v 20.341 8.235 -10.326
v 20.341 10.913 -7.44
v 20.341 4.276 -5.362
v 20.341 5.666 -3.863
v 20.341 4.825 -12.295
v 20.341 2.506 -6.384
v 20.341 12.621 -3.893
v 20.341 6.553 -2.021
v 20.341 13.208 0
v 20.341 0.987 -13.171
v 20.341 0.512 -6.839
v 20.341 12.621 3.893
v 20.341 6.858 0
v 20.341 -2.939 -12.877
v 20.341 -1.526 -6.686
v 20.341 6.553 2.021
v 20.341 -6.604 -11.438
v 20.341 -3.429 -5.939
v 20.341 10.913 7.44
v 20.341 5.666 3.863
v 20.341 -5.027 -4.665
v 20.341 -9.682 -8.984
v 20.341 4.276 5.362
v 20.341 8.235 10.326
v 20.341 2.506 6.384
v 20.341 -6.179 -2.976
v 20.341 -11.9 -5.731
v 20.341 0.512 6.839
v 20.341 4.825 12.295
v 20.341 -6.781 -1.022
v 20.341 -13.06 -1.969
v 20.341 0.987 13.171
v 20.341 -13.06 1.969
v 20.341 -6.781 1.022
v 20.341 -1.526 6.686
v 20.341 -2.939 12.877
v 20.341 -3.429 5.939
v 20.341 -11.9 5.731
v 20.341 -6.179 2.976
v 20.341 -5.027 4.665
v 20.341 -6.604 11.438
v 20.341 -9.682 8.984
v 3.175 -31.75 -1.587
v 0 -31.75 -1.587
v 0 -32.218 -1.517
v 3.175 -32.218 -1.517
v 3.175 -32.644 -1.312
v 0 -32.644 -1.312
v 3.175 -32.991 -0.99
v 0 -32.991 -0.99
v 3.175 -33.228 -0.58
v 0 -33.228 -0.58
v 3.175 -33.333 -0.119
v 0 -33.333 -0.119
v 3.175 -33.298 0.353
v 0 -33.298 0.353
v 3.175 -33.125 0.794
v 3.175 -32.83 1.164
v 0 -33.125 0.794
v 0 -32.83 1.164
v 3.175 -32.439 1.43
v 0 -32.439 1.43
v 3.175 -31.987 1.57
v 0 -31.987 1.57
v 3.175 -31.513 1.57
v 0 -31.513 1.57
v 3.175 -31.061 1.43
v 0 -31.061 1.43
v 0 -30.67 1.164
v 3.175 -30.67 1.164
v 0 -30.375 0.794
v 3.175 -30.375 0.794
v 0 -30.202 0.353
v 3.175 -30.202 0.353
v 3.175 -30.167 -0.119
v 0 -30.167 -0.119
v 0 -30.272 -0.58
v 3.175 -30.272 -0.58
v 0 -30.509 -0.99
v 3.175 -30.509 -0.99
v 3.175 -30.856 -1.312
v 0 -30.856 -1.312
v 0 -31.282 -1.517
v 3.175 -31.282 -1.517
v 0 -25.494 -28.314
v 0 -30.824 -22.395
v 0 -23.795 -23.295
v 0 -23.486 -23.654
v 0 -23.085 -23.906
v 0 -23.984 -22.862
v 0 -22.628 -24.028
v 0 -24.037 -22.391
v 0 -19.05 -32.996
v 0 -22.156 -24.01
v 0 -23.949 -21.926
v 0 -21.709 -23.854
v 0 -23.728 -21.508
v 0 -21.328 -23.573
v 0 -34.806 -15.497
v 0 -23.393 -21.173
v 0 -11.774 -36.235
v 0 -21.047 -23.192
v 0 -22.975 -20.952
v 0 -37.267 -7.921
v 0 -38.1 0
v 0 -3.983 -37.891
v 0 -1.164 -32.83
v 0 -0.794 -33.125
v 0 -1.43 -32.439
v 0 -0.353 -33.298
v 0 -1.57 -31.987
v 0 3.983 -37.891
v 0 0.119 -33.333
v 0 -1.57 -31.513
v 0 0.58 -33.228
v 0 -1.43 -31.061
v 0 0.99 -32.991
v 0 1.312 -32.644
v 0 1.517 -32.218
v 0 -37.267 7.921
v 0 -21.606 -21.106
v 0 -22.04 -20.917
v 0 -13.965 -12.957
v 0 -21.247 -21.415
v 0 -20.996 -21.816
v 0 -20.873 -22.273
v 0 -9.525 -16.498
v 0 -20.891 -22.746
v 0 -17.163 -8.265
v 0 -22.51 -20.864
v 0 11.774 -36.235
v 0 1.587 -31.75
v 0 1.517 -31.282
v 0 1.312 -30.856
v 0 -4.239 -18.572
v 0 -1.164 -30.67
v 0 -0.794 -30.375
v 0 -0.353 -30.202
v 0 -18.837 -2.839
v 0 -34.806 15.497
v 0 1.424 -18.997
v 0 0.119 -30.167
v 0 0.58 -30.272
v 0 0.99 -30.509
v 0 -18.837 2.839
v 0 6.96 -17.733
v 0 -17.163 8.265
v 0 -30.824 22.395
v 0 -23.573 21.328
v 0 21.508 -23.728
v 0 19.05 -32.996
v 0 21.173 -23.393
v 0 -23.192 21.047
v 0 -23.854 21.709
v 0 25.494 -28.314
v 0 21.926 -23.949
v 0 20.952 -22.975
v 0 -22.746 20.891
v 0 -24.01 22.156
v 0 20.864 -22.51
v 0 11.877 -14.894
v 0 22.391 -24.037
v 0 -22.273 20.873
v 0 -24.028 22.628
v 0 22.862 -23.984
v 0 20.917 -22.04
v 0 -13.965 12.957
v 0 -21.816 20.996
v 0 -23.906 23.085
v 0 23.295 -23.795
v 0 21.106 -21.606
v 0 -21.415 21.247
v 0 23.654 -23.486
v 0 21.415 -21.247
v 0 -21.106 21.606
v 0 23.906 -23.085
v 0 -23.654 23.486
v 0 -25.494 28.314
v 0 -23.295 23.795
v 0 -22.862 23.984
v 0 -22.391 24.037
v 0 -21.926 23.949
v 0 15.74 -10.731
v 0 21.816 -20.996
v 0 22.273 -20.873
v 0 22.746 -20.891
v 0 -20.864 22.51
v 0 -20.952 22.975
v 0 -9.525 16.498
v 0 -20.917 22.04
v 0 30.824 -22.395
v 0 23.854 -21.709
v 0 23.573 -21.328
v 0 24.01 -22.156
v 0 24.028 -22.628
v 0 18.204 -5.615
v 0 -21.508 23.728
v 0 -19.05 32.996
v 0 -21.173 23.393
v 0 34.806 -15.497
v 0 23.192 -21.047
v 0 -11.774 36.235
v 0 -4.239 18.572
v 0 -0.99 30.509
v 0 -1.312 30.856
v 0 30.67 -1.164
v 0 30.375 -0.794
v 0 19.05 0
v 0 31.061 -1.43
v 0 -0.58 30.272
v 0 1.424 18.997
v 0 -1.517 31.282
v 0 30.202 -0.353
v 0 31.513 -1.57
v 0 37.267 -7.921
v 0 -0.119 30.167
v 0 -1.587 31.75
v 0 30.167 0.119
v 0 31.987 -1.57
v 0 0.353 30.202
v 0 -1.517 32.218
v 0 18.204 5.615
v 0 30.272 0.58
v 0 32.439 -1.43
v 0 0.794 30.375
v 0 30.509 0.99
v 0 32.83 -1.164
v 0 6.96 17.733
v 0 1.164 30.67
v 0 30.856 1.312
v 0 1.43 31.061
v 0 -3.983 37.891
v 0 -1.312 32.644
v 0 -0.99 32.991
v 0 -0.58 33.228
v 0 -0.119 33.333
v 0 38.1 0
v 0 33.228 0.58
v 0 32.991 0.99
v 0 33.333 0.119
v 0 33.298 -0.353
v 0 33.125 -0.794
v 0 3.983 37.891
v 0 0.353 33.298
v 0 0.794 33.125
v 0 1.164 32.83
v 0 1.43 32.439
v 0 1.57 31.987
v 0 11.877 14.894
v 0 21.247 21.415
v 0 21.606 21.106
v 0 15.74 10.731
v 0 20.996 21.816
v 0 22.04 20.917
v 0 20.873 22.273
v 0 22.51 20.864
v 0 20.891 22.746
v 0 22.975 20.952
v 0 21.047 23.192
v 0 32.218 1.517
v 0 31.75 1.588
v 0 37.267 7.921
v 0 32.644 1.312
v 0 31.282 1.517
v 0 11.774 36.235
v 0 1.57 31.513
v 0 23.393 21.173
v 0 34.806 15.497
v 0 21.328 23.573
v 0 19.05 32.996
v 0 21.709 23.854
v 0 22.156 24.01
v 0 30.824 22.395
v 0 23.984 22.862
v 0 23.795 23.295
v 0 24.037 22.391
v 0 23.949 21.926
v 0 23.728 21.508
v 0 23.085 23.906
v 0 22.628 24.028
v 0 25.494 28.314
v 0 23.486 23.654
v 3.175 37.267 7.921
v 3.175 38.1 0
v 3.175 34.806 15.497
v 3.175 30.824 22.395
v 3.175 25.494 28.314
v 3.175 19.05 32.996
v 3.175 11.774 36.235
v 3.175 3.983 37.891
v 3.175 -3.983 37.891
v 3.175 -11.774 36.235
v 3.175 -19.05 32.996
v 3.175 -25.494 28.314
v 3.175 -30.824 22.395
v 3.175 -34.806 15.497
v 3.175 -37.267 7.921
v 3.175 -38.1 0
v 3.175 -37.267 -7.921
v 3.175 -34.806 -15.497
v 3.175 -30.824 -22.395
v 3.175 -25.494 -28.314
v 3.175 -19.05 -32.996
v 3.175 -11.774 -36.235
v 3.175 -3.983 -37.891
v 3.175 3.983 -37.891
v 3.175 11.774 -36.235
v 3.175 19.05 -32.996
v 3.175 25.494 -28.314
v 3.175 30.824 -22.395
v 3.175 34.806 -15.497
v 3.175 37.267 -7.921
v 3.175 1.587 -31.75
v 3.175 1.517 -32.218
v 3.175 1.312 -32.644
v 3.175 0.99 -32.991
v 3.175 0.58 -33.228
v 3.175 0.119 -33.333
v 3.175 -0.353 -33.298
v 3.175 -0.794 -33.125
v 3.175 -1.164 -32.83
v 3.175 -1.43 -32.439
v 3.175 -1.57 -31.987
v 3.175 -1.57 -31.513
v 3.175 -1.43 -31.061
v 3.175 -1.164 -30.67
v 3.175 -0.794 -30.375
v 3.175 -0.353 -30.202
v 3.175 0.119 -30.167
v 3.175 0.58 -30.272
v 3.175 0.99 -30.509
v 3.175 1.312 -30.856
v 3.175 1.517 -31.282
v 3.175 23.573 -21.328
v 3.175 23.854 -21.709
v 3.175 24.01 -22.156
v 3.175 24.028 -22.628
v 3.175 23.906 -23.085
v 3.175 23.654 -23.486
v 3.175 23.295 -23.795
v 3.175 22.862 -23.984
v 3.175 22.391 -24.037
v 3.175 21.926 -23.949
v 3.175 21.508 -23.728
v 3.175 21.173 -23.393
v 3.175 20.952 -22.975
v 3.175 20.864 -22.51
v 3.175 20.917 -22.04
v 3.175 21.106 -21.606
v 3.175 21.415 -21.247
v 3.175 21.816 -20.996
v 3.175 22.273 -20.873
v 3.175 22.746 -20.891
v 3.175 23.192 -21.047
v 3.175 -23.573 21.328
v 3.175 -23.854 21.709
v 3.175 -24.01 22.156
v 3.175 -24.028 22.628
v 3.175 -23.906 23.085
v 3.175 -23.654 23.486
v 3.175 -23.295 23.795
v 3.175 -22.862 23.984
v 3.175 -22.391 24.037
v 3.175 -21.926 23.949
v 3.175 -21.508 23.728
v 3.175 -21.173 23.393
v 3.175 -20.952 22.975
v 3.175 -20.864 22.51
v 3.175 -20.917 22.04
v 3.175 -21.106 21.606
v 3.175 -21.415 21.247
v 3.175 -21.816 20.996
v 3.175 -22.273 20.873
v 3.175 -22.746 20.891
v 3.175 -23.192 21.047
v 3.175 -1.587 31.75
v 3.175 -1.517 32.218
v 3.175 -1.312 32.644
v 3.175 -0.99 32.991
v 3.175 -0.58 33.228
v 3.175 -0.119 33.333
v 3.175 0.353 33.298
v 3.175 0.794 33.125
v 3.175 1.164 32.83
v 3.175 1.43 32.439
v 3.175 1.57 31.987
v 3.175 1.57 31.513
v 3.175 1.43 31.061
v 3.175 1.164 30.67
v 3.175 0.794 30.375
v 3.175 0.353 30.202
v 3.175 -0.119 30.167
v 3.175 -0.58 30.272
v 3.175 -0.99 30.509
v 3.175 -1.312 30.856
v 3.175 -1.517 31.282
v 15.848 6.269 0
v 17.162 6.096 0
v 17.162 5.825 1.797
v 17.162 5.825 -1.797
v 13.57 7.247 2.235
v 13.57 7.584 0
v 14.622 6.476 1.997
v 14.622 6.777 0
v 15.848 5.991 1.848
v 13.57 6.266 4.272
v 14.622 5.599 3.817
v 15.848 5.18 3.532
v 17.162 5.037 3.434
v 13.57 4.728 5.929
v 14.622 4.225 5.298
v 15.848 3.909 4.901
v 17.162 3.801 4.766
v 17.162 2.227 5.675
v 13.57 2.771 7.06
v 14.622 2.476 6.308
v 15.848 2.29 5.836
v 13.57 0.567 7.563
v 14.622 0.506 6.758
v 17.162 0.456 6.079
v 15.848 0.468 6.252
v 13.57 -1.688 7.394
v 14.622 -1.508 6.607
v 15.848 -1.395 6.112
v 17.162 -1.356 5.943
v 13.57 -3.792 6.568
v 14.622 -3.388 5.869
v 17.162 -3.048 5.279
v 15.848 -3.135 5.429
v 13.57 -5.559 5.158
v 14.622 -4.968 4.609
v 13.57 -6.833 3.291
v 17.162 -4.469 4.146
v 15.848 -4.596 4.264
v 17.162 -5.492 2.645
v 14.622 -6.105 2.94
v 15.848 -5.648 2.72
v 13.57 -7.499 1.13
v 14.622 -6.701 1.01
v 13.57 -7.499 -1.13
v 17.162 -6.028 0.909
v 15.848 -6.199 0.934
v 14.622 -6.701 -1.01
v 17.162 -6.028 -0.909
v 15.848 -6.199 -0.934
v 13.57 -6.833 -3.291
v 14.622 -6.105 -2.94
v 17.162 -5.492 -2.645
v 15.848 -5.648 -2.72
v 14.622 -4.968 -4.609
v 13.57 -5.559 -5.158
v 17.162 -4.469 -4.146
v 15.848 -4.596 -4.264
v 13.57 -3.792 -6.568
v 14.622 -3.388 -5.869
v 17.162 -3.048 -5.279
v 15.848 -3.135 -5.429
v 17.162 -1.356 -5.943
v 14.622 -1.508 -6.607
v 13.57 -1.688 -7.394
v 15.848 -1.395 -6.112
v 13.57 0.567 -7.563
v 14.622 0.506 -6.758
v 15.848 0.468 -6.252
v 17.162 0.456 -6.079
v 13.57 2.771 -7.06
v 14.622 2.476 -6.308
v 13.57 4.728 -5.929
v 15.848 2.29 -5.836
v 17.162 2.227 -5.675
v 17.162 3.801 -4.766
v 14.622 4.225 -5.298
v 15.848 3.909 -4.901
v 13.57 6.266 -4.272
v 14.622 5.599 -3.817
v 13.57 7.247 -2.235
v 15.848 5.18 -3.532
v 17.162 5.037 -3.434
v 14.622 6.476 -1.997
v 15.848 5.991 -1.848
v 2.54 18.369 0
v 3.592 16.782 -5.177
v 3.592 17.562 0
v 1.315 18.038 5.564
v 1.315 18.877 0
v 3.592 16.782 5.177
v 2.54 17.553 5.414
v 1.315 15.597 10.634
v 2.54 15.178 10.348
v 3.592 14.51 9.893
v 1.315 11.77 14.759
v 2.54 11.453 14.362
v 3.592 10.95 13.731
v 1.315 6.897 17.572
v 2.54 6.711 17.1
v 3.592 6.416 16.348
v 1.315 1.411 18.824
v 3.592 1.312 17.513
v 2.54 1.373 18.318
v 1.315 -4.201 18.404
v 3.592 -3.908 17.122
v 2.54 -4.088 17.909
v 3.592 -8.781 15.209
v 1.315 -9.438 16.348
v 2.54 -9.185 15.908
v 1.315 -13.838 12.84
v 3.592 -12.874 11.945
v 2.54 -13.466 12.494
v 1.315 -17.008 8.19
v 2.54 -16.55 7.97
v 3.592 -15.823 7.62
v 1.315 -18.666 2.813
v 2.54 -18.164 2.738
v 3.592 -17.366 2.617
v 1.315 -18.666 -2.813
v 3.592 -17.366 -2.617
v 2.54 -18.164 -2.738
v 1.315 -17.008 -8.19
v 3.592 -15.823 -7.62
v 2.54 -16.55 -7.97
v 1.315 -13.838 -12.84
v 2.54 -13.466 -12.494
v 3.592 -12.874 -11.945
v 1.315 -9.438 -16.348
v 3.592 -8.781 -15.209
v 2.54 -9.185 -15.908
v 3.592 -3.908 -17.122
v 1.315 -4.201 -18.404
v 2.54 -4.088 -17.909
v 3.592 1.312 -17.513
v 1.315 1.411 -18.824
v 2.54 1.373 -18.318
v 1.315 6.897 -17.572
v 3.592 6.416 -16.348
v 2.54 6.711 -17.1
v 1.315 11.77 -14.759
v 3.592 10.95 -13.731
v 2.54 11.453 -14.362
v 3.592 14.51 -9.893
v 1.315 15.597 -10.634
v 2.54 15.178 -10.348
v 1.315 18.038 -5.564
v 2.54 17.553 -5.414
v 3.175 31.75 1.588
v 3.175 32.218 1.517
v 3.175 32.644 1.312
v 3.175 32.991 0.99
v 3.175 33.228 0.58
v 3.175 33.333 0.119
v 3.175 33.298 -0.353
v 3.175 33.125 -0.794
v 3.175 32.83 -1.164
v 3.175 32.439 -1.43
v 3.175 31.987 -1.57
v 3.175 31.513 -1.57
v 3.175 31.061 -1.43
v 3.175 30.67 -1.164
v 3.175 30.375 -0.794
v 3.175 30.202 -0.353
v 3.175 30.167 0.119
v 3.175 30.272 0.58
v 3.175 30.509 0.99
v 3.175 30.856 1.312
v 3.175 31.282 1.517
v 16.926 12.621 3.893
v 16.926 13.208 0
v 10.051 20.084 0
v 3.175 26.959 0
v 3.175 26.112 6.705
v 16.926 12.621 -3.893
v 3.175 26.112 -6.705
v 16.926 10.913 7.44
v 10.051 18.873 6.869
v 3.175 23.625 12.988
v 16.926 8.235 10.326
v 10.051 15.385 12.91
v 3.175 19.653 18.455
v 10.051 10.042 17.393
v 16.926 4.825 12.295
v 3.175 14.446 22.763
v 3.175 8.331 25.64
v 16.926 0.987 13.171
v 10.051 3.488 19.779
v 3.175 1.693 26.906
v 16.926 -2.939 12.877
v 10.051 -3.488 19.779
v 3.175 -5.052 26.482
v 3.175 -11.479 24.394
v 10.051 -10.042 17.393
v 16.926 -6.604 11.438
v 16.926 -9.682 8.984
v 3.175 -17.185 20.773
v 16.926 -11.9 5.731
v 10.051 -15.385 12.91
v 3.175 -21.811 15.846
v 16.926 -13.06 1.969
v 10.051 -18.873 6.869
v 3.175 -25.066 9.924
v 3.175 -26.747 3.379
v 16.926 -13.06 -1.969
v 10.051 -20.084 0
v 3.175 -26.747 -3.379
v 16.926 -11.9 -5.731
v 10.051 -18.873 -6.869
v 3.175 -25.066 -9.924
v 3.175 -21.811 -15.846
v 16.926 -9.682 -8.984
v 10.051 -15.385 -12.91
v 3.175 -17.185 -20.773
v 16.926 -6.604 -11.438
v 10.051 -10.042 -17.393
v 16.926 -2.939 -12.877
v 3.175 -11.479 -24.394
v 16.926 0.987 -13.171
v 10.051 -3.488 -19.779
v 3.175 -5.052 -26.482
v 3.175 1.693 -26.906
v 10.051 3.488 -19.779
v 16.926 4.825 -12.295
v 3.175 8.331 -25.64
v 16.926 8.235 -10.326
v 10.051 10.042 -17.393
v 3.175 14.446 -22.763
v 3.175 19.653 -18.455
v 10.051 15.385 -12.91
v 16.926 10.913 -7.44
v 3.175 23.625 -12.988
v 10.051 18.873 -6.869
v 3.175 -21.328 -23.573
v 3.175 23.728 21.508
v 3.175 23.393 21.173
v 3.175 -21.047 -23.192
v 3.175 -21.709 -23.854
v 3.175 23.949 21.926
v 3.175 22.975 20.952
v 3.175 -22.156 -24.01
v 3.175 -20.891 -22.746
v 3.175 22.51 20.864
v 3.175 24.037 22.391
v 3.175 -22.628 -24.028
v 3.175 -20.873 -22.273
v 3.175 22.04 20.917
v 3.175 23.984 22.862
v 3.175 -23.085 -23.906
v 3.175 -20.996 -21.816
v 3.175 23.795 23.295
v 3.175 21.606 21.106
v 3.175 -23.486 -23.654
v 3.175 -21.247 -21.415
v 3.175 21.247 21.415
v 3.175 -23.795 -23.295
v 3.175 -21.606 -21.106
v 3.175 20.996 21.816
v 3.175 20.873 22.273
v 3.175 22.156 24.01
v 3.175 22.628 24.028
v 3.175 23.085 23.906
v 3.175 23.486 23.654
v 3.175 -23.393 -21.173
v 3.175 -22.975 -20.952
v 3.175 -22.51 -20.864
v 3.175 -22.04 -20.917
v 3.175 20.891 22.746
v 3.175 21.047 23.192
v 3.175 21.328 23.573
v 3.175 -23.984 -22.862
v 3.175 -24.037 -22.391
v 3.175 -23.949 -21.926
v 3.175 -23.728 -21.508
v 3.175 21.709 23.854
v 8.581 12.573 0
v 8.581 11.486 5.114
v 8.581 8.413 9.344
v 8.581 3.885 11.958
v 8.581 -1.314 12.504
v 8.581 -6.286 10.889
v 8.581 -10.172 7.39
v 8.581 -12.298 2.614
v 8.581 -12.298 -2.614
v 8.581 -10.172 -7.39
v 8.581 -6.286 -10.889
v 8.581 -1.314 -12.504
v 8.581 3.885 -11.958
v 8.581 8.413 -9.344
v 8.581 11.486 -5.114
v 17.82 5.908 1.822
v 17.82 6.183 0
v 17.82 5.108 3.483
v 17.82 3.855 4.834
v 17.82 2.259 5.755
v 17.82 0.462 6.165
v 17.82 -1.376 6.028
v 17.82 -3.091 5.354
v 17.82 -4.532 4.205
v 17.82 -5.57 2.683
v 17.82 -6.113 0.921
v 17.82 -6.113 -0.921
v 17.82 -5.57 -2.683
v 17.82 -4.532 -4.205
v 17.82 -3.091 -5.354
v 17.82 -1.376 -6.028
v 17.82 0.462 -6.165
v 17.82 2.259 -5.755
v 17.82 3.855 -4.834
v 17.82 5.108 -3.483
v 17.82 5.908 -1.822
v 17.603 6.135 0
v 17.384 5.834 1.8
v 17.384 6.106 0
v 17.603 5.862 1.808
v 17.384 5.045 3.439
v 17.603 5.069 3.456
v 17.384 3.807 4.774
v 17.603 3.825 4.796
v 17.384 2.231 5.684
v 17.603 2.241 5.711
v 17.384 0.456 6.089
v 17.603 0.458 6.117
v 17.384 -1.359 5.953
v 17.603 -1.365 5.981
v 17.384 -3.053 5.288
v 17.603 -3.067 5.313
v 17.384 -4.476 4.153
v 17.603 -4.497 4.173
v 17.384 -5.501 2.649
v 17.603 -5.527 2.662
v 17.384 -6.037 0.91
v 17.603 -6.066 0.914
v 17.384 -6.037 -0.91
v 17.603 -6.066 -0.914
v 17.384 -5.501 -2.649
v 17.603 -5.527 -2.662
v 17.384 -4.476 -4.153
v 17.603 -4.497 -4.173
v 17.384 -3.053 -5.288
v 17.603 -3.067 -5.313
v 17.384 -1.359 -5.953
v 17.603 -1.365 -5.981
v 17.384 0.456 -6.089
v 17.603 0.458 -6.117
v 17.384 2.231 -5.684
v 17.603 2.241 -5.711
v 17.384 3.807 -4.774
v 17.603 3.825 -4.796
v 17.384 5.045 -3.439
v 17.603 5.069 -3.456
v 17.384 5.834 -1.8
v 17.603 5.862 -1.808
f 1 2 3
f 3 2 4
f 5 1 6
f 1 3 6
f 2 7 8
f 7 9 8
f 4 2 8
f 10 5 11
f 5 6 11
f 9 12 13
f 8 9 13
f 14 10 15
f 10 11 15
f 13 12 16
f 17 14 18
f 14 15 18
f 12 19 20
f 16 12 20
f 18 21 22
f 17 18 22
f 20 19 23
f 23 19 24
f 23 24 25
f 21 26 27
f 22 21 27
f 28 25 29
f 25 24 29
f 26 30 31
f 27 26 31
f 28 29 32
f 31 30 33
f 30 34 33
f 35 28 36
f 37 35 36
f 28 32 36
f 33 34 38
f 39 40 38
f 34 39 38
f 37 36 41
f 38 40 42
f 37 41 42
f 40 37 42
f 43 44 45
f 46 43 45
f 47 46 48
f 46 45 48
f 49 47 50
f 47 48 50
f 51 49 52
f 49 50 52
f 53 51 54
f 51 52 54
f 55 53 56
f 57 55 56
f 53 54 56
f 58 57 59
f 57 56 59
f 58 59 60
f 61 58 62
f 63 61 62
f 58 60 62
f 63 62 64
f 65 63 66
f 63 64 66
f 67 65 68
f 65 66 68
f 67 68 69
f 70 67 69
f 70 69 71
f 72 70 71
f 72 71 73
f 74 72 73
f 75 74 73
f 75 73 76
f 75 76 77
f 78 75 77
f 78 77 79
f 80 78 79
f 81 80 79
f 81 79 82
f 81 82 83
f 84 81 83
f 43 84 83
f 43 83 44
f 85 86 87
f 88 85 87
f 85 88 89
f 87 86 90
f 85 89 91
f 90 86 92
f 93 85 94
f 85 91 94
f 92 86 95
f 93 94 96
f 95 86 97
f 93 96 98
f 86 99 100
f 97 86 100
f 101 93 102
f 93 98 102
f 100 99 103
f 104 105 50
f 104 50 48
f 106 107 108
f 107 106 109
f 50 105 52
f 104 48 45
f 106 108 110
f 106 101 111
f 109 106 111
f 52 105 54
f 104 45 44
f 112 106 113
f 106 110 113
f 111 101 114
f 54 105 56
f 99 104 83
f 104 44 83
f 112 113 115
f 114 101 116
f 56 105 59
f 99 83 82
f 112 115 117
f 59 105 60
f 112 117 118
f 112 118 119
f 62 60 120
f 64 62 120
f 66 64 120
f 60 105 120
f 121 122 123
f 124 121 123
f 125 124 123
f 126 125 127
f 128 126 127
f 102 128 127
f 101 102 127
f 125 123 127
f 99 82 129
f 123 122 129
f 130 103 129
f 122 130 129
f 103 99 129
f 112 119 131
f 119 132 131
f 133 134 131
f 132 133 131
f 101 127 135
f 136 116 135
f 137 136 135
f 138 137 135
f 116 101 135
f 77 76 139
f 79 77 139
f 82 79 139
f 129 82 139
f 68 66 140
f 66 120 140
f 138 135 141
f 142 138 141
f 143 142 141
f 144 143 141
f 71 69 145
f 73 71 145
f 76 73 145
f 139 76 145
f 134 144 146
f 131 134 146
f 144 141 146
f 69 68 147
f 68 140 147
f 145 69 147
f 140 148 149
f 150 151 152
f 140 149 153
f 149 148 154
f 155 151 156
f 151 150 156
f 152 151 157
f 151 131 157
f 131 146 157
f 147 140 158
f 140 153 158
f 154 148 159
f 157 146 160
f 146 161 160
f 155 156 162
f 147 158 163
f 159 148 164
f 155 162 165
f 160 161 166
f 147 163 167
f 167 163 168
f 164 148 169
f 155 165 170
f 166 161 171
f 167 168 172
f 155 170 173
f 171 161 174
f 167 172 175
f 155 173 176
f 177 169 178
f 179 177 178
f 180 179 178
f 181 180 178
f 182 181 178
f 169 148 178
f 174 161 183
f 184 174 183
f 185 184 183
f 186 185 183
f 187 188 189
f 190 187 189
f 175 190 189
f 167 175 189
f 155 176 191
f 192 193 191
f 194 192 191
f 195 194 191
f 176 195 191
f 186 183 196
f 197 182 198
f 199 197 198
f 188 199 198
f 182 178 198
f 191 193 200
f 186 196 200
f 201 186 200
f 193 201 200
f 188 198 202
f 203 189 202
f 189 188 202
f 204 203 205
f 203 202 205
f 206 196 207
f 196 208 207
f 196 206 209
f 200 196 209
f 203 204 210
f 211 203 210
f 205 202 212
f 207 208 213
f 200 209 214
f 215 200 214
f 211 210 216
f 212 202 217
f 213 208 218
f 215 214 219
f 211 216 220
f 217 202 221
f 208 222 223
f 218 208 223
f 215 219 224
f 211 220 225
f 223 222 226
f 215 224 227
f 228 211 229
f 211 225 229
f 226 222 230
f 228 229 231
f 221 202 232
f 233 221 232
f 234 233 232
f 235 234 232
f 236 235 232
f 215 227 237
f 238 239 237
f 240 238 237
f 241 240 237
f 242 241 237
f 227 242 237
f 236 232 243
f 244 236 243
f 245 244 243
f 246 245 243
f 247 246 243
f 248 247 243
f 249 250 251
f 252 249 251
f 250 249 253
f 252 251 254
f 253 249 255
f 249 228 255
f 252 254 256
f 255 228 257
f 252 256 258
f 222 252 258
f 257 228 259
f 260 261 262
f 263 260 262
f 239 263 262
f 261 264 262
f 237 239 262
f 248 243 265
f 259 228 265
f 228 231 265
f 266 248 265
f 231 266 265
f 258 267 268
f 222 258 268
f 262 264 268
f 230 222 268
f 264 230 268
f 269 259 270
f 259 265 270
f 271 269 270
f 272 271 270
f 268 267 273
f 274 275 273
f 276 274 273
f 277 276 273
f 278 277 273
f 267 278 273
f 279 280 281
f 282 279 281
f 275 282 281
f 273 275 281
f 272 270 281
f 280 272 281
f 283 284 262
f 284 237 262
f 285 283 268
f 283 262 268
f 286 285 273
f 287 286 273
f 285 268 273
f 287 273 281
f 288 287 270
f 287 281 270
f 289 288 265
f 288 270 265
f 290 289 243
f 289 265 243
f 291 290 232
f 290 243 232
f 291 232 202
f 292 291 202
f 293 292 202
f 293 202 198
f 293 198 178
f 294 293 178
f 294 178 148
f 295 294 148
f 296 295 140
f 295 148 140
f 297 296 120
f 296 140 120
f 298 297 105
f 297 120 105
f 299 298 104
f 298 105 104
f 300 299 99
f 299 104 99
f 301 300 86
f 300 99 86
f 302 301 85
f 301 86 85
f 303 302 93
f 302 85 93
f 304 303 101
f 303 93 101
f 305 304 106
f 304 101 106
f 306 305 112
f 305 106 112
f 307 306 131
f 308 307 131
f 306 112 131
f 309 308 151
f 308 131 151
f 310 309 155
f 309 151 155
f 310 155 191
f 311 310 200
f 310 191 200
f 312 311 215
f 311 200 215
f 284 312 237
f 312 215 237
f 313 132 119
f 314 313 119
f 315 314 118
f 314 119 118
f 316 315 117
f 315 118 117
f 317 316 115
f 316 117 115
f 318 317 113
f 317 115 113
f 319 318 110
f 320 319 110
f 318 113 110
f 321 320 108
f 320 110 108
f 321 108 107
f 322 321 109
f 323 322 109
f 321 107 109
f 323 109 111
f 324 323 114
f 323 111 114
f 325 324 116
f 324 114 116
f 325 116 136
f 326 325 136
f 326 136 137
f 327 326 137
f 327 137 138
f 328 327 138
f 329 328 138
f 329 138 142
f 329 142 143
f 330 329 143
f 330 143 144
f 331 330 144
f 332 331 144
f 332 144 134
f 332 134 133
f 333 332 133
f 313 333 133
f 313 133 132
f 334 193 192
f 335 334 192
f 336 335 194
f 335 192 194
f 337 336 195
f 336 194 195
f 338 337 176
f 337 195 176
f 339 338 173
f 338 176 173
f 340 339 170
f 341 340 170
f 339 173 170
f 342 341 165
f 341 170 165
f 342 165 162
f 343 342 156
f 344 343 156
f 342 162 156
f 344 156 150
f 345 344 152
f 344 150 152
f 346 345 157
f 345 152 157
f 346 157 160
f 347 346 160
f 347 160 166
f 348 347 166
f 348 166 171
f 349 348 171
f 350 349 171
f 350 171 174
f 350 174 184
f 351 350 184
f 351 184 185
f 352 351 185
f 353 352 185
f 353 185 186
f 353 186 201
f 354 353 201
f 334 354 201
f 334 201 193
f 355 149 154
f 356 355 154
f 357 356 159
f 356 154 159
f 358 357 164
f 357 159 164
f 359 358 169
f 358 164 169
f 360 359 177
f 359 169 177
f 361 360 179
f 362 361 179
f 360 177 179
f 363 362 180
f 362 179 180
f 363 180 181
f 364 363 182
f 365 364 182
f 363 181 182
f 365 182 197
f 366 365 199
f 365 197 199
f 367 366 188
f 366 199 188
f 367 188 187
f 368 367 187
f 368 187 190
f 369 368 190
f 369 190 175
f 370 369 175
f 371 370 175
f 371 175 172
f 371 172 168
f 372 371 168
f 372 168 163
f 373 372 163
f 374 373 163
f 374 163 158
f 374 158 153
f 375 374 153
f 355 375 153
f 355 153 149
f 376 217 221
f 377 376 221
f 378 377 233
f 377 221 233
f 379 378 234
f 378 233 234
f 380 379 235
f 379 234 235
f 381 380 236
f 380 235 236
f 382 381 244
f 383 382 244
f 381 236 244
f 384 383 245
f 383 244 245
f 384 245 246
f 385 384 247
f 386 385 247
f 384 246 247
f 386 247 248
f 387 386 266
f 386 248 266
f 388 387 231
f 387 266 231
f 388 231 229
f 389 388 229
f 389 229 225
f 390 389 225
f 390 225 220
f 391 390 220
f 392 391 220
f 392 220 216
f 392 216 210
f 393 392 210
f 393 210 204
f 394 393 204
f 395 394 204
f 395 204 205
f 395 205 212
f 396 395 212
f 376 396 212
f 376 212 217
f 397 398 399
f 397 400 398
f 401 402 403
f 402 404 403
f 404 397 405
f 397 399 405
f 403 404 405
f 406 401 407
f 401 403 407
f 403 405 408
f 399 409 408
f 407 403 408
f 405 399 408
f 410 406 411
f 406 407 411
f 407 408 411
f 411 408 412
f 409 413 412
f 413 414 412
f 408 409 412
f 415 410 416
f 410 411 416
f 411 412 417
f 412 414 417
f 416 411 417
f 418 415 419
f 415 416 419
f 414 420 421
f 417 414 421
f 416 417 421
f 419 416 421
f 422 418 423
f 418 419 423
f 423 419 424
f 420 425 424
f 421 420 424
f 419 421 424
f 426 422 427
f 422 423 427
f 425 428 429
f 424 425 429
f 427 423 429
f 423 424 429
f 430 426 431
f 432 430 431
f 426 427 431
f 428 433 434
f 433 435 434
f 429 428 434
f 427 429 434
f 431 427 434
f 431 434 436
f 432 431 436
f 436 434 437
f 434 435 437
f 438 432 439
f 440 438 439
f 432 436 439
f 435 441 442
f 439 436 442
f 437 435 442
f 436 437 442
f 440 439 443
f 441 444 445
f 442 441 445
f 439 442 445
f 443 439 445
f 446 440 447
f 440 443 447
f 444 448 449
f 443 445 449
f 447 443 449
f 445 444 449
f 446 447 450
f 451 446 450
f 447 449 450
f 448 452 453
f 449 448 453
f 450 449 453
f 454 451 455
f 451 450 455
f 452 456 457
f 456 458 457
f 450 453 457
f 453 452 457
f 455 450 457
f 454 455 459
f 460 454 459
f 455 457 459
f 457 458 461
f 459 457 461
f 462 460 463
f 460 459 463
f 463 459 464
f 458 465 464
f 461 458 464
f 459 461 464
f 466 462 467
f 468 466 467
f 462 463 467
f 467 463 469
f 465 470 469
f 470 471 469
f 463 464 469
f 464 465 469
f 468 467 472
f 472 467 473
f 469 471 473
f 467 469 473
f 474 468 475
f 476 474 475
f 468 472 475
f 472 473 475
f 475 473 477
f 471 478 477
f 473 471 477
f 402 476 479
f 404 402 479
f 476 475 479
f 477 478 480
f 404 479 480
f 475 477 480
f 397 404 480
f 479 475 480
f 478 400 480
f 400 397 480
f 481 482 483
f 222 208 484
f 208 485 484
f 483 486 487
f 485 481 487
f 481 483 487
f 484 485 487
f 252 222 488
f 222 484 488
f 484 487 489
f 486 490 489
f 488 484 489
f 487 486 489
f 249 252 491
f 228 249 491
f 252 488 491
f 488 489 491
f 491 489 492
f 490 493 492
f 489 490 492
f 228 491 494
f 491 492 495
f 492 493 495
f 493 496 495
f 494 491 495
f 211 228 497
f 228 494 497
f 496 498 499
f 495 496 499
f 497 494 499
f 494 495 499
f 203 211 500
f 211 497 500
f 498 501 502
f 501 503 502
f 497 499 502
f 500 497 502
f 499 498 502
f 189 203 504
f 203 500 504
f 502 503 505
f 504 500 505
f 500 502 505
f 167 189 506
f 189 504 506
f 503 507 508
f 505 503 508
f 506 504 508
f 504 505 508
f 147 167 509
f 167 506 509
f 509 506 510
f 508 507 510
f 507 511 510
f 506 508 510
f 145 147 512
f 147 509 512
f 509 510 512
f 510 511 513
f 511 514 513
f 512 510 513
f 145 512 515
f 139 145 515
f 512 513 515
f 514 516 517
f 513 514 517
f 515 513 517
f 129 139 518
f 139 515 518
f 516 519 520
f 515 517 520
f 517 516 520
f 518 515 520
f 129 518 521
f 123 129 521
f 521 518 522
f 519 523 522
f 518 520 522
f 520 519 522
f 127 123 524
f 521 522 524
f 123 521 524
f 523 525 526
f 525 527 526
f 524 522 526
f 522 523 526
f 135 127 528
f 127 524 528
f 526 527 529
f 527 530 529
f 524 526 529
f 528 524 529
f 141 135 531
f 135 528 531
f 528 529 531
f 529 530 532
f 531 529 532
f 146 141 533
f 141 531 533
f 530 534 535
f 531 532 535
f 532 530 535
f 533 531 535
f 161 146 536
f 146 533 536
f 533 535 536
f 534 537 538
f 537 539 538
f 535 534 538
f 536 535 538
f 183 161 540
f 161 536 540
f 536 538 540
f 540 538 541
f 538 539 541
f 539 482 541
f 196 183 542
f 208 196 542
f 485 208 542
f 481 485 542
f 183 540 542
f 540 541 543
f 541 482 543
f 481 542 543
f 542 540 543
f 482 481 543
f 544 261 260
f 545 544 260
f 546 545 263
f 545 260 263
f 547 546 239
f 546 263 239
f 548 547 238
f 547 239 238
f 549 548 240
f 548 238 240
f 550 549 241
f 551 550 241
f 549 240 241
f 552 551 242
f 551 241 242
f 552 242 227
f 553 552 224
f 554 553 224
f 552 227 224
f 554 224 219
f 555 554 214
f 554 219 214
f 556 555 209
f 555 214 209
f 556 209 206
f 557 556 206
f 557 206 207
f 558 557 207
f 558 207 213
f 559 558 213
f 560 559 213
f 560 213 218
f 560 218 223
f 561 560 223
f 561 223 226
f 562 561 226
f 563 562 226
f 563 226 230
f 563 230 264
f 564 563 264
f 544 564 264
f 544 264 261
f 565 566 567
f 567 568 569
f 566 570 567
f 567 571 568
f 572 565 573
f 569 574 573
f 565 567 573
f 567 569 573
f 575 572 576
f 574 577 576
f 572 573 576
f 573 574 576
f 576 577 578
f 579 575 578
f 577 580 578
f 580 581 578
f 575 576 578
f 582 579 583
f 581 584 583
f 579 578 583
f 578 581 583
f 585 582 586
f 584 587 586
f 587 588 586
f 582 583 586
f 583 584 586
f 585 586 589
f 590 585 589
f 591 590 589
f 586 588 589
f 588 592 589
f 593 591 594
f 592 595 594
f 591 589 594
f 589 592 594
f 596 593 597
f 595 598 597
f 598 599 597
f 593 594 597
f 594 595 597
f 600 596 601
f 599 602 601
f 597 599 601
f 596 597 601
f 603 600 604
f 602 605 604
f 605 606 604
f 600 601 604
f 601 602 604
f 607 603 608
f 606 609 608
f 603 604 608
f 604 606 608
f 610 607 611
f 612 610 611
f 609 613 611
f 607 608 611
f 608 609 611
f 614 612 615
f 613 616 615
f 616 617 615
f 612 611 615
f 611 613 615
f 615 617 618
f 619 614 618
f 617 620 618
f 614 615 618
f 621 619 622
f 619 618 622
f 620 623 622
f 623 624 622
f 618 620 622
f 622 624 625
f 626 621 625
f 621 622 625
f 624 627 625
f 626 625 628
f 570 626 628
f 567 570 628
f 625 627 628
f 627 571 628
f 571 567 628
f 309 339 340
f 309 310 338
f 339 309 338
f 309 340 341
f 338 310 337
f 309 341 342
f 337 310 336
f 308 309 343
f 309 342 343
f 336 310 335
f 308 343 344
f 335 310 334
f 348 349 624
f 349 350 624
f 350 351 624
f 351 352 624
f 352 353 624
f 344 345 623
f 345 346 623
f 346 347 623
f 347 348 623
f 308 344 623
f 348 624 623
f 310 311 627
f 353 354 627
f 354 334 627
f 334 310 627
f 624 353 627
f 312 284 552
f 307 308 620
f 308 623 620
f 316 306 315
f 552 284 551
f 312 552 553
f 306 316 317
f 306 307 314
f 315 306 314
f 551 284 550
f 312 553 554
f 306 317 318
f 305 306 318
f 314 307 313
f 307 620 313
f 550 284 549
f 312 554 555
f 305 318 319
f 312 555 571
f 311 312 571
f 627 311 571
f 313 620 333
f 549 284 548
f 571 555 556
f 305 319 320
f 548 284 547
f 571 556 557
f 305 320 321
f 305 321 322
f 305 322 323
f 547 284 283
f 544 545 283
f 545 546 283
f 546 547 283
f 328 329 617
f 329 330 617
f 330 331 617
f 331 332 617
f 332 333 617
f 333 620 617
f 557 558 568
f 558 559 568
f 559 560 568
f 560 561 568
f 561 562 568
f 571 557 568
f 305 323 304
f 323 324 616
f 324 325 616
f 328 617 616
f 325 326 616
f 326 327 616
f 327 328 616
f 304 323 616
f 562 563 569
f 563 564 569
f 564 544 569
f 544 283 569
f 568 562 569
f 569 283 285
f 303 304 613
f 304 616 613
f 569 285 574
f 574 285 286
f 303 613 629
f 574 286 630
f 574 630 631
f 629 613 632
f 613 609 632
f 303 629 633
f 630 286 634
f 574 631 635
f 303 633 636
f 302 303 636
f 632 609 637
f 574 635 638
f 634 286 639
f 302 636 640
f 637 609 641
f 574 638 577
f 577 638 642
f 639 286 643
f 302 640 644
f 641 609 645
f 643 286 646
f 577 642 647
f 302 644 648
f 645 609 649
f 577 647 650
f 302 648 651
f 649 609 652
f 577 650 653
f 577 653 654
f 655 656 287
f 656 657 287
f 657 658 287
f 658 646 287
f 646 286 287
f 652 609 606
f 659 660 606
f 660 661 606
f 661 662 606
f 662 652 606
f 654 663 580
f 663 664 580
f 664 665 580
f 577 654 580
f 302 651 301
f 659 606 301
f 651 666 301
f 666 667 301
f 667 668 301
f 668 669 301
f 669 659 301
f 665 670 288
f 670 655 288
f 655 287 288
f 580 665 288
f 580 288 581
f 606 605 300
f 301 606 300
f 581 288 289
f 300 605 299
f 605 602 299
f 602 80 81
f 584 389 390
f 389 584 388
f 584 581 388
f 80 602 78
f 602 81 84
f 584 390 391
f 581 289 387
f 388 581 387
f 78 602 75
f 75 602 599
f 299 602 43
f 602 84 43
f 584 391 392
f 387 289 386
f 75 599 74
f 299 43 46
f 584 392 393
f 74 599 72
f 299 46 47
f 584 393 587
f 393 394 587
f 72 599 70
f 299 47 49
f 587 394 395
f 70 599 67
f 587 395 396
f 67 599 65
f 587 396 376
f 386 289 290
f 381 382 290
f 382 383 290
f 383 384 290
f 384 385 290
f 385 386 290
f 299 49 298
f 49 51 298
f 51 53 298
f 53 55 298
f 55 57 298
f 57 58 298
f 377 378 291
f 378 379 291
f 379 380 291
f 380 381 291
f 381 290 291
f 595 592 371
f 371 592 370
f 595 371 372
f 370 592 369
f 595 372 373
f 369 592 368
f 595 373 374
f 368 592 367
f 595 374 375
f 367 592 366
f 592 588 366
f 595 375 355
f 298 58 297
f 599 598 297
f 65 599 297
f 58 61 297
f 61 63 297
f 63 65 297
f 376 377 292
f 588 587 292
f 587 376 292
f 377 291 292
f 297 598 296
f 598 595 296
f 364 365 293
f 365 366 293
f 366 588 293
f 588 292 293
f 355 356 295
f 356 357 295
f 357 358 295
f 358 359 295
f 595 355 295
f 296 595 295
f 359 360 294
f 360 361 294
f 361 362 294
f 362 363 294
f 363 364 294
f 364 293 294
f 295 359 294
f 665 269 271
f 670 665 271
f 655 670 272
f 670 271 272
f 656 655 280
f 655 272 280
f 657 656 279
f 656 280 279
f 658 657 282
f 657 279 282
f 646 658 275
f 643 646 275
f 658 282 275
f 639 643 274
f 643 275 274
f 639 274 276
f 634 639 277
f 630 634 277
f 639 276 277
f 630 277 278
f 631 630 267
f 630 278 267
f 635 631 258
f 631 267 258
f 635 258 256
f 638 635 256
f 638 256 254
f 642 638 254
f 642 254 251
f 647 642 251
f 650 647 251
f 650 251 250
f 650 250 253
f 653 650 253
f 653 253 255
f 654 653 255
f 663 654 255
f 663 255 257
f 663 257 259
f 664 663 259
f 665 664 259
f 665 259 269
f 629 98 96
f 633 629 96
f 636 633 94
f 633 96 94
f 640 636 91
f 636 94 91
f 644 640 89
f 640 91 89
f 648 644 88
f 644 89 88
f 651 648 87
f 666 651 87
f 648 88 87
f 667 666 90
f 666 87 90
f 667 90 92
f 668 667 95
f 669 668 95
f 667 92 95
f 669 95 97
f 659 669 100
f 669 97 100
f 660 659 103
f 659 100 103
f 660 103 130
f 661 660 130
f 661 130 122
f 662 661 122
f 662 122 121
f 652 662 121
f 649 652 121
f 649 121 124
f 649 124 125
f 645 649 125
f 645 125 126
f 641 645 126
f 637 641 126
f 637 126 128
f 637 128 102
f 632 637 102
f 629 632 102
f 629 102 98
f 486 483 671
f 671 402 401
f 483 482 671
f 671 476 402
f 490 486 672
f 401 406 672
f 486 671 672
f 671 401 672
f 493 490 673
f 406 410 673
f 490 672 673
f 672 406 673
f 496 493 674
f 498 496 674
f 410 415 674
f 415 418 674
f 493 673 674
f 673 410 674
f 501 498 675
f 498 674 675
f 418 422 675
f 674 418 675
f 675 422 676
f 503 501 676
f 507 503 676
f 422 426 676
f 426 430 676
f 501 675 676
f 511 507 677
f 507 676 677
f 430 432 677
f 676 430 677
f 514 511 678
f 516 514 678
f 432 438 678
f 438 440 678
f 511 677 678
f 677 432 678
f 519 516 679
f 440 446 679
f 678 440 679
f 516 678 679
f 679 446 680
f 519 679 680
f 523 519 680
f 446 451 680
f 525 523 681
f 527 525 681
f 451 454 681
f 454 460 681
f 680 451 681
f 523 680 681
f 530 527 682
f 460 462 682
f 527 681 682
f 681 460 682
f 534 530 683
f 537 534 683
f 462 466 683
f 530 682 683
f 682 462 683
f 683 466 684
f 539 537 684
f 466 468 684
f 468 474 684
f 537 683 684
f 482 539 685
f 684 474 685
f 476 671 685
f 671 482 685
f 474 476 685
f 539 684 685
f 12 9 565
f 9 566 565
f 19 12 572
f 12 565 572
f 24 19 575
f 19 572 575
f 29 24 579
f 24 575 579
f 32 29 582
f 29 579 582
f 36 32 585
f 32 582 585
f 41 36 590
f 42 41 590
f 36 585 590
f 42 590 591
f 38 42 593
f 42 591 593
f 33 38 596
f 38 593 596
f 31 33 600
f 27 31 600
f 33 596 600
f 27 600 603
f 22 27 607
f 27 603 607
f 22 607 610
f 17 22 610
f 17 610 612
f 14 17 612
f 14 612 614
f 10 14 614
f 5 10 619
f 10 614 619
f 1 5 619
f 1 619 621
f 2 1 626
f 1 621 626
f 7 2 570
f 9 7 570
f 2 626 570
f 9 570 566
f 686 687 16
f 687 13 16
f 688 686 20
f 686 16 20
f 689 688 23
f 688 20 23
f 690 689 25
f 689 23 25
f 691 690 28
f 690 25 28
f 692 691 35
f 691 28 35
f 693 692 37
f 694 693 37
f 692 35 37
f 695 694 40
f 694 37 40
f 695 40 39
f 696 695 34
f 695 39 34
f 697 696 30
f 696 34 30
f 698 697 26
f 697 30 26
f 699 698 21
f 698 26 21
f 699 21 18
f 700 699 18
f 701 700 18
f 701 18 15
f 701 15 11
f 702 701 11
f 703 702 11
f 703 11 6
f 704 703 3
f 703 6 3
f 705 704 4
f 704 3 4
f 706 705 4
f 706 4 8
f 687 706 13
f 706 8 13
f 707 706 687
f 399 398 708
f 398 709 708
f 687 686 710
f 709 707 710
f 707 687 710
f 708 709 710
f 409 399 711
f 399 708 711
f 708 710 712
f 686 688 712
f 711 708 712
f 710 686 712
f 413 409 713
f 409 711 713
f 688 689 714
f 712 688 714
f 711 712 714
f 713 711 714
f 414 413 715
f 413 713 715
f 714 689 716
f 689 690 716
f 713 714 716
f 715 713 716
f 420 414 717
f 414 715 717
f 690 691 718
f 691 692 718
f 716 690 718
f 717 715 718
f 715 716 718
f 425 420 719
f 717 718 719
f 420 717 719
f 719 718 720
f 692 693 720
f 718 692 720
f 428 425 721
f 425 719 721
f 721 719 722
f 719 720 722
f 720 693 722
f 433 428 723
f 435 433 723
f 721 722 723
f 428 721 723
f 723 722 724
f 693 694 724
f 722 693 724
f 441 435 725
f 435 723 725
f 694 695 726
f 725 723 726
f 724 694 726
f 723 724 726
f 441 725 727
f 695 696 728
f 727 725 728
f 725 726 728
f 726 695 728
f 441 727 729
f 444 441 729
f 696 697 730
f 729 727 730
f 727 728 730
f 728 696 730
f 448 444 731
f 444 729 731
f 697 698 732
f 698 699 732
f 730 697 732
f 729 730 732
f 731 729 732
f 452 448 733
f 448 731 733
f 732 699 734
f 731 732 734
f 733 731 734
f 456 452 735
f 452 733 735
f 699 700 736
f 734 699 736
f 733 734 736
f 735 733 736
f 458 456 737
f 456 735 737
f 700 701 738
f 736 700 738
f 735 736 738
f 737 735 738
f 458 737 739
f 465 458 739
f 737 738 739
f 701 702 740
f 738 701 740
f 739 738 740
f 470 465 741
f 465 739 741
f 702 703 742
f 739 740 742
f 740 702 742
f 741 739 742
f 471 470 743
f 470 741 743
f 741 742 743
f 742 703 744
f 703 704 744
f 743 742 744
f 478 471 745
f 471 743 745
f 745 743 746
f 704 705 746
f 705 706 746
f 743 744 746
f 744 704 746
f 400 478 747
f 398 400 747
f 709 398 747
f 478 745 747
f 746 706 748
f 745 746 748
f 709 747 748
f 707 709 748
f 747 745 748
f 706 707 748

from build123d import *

# Parameters (mm, degrees)
F_1_8_0_125_DIAMETER_HOLE1_D = 3.175
CIRPATTERN1_COUNT            = 8


with BuildPart() as part:
    # Sketch1 → Revolve1 (revolve)
    with BuildSketch(Plane.XY):
        with BuildLine():
            Line((3.592102448, 17.562102448), (13.570307345, 7.583897552))
            ThreePointArc((13.570307345, 7.583897552), (15.218377957, 6.482691975), (17.162409794, 6.096))
            ThreePointArc((17.162409794, 6.096), (17.493946322, 6.117730052), (17.819810168, 6.182548401))
            Line((17.819810168, 6.182548401), (20.340629853, 6.858))
            Line((20.340629853, 6.858), (20.340629853, 13.208))
            Line((20.340629853, 13.208), (16.926461018, 13.208))
            Line((16.926461018, 13.208), (3.175, 26.959461018))
            Line((3.175, 26.959461018), (3.175, 38.1))
            Line((3.175, 38.1), (0, 38.1))
            Line((0, 38.1), (0, 19.05))
            ThreePointArc((0, 19.05), (1.944031836, 18.663308025), (3.592102448, 17.562102448))
        make_face()
    revolve(axis=Axis((0, 0, 0), (1, 0, 0)))

    # 1/8 (0.125) Diameter Hole1 (through all)
    with Locations(Plane(origin=(3.175, 0, 0), x_dir=(0, 0, -1), z_dir=(1, 0, 0))):
        with Locations((0, 31.75)):
            f_1_8_0_125_diameter_hole1 = Hole(F_1_8_0_125_DIAMETER_HOLE1_D / 2)

    # CirPattern1: 1/8 (0.125) Diameter Hole1 ×8 about axis
    cirpattern1_axis = Axis((-78.819685074, 0, 0), (1, 0, 0))
    for i in range(1, CIRPATTERN1_COUNT):
        add(f_1_8_0_125_diameter_hole1.rotate(cirpattern1_axis, i * 360 / CIRPATTERN1_COUNT), mode=Mode.SUBTRACT)


solid = part.part
